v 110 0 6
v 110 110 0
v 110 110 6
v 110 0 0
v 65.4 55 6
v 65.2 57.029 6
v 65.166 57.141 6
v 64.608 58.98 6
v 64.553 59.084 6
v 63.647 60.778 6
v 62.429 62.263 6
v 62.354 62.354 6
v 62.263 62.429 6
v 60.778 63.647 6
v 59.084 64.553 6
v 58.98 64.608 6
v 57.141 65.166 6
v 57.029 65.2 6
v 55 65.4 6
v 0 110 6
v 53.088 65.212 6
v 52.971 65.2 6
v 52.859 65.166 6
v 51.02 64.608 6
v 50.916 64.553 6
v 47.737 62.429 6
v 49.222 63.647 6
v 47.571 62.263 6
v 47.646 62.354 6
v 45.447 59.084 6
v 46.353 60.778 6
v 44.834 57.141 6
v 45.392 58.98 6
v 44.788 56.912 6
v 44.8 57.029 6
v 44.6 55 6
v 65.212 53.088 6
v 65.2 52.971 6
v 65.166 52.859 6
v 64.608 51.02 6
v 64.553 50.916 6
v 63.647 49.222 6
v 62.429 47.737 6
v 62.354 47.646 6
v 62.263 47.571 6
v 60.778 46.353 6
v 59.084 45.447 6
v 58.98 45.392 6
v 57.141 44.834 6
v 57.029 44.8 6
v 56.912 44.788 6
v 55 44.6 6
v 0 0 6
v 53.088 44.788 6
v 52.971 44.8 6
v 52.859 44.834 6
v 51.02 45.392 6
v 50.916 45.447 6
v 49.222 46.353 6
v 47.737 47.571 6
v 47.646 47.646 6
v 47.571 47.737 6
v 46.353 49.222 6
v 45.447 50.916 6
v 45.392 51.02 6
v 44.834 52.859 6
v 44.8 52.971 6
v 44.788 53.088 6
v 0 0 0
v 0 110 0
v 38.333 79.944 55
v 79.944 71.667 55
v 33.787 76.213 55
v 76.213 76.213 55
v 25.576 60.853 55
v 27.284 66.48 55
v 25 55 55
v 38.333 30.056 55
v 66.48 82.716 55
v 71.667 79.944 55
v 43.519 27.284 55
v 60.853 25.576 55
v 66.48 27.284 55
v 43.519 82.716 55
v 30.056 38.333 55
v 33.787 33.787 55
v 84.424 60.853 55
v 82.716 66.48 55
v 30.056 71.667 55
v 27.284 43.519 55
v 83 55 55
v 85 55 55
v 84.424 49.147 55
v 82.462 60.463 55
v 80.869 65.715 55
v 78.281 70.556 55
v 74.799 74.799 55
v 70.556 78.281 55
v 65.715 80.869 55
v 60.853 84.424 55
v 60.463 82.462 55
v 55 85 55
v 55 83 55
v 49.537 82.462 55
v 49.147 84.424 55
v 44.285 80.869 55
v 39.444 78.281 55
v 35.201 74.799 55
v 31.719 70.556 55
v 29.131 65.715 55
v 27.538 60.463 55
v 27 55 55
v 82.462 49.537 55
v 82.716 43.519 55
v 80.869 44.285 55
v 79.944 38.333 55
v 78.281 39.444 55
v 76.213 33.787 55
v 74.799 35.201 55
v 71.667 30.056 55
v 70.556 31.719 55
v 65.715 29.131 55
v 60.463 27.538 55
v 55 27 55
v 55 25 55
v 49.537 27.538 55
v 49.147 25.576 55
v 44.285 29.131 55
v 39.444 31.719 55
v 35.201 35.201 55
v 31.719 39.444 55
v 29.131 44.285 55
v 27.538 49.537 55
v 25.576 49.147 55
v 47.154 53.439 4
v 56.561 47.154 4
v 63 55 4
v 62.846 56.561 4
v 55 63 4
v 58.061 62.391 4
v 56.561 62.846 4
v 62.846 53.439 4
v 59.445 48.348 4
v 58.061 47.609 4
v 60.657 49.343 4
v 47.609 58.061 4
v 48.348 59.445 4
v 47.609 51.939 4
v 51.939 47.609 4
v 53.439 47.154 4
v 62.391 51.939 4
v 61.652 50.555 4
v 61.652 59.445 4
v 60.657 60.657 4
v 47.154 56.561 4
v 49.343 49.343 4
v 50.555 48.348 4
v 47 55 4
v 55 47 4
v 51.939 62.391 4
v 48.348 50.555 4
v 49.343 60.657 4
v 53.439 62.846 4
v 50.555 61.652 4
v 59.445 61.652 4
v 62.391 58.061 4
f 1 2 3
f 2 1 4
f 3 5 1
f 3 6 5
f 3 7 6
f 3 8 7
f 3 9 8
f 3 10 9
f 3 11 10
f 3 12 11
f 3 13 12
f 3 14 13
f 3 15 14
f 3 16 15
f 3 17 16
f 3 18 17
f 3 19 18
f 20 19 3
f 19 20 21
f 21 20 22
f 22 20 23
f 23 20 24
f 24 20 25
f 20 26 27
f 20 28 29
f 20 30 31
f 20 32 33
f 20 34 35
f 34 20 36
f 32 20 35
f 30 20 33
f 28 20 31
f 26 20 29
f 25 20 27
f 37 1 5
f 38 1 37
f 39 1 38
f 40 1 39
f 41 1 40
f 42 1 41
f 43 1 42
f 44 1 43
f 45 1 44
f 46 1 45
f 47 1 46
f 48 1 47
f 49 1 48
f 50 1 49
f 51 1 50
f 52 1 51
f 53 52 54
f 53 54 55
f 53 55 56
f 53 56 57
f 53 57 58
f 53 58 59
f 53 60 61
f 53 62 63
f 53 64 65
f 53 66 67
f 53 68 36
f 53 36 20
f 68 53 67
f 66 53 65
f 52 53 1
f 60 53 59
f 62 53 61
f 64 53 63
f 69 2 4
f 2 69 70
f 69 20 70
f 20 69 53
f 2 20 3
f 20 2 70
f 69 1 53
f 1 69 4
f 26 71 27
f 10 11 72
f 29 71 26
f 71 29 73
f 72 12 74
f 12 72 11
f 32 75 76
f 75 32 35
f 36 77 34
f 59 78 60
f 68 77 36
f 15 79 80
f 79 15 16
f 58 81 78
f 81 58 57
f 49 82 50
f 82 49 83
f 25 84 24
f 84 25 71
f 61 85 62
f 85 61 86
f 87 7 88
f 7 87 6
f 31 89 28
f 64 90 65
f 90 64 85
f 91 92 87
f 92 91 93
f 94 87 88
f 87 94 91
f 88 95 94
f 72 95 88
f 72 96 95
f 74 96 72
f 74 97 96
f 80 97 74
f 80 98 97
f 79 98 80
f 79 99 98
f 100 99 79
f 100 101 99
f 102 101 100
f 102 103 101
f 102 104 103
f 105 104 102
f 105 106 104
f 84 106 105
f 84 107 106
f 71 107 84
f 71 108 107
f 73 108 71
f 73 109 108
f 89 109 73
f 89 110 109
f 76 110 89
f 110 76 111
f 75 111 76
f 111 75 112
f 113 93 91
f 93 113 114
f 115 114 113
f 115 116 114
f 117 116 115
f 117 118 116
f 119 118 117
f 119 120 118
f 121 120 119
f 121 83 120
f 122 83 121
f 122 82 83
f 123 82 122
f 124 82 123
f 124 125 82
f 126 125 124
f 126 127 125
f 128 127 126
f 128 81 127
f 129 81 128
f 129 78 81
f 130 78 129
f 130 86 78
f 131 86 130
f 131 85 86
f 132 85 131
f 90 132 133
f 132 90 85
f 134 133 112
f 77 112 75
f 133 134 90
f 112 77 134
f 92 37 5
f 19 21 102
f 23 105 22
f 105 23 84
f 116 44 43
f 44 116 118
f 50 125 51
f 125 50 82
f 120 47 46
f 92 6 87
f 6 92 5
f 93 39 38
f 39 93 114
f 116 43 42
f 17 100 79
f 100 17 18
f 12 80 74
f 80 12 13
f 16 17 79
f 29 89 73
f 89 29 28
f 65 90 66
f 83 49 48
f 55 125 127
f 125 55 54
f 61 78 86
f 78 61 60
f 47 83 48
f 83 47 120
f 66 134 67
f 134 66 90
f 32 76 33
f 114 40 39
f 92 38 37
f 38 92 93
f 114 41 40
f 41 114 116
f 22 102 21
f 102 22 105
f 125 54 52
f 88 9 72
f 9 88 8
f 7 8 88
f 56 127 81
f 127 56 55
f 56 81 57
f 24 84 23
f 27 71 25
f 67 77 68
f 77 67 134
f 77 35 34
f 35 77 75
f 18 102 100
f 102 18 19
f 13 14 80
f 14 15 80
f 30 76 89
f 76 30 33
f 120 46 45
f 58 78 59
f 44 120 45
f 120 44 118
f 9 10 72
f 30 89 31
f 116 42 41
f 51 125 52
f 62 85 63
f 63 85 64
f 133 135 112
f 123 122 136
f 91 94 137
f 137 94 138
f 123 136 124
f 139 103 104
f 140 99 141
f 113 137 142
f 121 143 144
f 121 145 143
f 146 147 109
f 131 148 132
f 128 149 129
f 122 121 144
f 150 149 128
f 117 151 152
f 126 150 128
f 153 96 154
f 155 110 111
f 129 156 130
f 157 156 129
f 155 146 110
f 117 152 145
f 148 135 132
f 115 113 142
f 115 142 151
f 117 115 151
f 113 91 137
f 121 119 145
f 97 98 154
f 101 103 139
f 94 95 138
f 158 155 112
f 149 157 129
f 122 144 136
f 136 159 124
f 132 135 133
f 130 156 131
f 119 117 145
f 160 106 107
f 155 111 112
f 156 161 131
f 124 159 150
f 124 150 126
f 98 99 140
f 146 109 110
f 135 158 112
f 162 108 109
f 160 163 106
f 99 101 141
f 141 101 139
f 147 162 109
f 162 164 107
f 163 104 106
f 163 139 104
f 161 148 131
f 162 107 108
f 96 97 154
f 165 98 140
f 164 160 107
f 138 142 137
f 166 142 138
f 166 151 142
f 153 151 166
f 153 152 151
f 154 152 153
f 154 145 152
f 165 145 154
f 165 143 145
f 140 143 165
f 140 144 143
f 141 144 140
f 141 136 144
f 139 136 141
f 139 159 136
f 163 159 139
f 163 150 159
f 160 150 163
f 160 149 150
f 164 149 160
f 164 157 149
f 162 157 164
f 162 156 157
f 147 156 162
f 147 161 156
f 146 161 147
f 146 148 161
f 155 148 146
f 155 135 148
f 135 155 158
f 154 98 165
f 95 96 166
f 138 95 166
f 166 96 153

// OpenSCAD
$fn = 32;

// ----------------------------------------------------------------------
// Hopper: funnel with square flange
// ----------------------------------------------------------------------

// --- parameters (mm) ---
fl = 110;                 // flange side, X and Y
fl_t = 6;                 // flange thickness
cone_h = 50;              // cone height above the flange
top_d = 60;               // cone mouth diameter
bot_d = 20;               // cone spout diameter
wall = 2;                 // cone wall thickness

bore_d = bot_d - 2 * wall;  // spout bore diameter
total_h = fl_t + cone_h - 1;  // overall height

difference() {
  union() {
    cube([fl, fl, fl_t]);
    translate([fl / 2, fl / 2, fl_t - 1])
      cylinder(h = cone_h, d1 = bot_d, d2 = top_d);
  }
  translate([fl / 2, fl / 2, fl_t - 2])
    cylinder(h = cone_h + 1, d1 = bore_d, d2 = top_d - 2 * wall);
}
